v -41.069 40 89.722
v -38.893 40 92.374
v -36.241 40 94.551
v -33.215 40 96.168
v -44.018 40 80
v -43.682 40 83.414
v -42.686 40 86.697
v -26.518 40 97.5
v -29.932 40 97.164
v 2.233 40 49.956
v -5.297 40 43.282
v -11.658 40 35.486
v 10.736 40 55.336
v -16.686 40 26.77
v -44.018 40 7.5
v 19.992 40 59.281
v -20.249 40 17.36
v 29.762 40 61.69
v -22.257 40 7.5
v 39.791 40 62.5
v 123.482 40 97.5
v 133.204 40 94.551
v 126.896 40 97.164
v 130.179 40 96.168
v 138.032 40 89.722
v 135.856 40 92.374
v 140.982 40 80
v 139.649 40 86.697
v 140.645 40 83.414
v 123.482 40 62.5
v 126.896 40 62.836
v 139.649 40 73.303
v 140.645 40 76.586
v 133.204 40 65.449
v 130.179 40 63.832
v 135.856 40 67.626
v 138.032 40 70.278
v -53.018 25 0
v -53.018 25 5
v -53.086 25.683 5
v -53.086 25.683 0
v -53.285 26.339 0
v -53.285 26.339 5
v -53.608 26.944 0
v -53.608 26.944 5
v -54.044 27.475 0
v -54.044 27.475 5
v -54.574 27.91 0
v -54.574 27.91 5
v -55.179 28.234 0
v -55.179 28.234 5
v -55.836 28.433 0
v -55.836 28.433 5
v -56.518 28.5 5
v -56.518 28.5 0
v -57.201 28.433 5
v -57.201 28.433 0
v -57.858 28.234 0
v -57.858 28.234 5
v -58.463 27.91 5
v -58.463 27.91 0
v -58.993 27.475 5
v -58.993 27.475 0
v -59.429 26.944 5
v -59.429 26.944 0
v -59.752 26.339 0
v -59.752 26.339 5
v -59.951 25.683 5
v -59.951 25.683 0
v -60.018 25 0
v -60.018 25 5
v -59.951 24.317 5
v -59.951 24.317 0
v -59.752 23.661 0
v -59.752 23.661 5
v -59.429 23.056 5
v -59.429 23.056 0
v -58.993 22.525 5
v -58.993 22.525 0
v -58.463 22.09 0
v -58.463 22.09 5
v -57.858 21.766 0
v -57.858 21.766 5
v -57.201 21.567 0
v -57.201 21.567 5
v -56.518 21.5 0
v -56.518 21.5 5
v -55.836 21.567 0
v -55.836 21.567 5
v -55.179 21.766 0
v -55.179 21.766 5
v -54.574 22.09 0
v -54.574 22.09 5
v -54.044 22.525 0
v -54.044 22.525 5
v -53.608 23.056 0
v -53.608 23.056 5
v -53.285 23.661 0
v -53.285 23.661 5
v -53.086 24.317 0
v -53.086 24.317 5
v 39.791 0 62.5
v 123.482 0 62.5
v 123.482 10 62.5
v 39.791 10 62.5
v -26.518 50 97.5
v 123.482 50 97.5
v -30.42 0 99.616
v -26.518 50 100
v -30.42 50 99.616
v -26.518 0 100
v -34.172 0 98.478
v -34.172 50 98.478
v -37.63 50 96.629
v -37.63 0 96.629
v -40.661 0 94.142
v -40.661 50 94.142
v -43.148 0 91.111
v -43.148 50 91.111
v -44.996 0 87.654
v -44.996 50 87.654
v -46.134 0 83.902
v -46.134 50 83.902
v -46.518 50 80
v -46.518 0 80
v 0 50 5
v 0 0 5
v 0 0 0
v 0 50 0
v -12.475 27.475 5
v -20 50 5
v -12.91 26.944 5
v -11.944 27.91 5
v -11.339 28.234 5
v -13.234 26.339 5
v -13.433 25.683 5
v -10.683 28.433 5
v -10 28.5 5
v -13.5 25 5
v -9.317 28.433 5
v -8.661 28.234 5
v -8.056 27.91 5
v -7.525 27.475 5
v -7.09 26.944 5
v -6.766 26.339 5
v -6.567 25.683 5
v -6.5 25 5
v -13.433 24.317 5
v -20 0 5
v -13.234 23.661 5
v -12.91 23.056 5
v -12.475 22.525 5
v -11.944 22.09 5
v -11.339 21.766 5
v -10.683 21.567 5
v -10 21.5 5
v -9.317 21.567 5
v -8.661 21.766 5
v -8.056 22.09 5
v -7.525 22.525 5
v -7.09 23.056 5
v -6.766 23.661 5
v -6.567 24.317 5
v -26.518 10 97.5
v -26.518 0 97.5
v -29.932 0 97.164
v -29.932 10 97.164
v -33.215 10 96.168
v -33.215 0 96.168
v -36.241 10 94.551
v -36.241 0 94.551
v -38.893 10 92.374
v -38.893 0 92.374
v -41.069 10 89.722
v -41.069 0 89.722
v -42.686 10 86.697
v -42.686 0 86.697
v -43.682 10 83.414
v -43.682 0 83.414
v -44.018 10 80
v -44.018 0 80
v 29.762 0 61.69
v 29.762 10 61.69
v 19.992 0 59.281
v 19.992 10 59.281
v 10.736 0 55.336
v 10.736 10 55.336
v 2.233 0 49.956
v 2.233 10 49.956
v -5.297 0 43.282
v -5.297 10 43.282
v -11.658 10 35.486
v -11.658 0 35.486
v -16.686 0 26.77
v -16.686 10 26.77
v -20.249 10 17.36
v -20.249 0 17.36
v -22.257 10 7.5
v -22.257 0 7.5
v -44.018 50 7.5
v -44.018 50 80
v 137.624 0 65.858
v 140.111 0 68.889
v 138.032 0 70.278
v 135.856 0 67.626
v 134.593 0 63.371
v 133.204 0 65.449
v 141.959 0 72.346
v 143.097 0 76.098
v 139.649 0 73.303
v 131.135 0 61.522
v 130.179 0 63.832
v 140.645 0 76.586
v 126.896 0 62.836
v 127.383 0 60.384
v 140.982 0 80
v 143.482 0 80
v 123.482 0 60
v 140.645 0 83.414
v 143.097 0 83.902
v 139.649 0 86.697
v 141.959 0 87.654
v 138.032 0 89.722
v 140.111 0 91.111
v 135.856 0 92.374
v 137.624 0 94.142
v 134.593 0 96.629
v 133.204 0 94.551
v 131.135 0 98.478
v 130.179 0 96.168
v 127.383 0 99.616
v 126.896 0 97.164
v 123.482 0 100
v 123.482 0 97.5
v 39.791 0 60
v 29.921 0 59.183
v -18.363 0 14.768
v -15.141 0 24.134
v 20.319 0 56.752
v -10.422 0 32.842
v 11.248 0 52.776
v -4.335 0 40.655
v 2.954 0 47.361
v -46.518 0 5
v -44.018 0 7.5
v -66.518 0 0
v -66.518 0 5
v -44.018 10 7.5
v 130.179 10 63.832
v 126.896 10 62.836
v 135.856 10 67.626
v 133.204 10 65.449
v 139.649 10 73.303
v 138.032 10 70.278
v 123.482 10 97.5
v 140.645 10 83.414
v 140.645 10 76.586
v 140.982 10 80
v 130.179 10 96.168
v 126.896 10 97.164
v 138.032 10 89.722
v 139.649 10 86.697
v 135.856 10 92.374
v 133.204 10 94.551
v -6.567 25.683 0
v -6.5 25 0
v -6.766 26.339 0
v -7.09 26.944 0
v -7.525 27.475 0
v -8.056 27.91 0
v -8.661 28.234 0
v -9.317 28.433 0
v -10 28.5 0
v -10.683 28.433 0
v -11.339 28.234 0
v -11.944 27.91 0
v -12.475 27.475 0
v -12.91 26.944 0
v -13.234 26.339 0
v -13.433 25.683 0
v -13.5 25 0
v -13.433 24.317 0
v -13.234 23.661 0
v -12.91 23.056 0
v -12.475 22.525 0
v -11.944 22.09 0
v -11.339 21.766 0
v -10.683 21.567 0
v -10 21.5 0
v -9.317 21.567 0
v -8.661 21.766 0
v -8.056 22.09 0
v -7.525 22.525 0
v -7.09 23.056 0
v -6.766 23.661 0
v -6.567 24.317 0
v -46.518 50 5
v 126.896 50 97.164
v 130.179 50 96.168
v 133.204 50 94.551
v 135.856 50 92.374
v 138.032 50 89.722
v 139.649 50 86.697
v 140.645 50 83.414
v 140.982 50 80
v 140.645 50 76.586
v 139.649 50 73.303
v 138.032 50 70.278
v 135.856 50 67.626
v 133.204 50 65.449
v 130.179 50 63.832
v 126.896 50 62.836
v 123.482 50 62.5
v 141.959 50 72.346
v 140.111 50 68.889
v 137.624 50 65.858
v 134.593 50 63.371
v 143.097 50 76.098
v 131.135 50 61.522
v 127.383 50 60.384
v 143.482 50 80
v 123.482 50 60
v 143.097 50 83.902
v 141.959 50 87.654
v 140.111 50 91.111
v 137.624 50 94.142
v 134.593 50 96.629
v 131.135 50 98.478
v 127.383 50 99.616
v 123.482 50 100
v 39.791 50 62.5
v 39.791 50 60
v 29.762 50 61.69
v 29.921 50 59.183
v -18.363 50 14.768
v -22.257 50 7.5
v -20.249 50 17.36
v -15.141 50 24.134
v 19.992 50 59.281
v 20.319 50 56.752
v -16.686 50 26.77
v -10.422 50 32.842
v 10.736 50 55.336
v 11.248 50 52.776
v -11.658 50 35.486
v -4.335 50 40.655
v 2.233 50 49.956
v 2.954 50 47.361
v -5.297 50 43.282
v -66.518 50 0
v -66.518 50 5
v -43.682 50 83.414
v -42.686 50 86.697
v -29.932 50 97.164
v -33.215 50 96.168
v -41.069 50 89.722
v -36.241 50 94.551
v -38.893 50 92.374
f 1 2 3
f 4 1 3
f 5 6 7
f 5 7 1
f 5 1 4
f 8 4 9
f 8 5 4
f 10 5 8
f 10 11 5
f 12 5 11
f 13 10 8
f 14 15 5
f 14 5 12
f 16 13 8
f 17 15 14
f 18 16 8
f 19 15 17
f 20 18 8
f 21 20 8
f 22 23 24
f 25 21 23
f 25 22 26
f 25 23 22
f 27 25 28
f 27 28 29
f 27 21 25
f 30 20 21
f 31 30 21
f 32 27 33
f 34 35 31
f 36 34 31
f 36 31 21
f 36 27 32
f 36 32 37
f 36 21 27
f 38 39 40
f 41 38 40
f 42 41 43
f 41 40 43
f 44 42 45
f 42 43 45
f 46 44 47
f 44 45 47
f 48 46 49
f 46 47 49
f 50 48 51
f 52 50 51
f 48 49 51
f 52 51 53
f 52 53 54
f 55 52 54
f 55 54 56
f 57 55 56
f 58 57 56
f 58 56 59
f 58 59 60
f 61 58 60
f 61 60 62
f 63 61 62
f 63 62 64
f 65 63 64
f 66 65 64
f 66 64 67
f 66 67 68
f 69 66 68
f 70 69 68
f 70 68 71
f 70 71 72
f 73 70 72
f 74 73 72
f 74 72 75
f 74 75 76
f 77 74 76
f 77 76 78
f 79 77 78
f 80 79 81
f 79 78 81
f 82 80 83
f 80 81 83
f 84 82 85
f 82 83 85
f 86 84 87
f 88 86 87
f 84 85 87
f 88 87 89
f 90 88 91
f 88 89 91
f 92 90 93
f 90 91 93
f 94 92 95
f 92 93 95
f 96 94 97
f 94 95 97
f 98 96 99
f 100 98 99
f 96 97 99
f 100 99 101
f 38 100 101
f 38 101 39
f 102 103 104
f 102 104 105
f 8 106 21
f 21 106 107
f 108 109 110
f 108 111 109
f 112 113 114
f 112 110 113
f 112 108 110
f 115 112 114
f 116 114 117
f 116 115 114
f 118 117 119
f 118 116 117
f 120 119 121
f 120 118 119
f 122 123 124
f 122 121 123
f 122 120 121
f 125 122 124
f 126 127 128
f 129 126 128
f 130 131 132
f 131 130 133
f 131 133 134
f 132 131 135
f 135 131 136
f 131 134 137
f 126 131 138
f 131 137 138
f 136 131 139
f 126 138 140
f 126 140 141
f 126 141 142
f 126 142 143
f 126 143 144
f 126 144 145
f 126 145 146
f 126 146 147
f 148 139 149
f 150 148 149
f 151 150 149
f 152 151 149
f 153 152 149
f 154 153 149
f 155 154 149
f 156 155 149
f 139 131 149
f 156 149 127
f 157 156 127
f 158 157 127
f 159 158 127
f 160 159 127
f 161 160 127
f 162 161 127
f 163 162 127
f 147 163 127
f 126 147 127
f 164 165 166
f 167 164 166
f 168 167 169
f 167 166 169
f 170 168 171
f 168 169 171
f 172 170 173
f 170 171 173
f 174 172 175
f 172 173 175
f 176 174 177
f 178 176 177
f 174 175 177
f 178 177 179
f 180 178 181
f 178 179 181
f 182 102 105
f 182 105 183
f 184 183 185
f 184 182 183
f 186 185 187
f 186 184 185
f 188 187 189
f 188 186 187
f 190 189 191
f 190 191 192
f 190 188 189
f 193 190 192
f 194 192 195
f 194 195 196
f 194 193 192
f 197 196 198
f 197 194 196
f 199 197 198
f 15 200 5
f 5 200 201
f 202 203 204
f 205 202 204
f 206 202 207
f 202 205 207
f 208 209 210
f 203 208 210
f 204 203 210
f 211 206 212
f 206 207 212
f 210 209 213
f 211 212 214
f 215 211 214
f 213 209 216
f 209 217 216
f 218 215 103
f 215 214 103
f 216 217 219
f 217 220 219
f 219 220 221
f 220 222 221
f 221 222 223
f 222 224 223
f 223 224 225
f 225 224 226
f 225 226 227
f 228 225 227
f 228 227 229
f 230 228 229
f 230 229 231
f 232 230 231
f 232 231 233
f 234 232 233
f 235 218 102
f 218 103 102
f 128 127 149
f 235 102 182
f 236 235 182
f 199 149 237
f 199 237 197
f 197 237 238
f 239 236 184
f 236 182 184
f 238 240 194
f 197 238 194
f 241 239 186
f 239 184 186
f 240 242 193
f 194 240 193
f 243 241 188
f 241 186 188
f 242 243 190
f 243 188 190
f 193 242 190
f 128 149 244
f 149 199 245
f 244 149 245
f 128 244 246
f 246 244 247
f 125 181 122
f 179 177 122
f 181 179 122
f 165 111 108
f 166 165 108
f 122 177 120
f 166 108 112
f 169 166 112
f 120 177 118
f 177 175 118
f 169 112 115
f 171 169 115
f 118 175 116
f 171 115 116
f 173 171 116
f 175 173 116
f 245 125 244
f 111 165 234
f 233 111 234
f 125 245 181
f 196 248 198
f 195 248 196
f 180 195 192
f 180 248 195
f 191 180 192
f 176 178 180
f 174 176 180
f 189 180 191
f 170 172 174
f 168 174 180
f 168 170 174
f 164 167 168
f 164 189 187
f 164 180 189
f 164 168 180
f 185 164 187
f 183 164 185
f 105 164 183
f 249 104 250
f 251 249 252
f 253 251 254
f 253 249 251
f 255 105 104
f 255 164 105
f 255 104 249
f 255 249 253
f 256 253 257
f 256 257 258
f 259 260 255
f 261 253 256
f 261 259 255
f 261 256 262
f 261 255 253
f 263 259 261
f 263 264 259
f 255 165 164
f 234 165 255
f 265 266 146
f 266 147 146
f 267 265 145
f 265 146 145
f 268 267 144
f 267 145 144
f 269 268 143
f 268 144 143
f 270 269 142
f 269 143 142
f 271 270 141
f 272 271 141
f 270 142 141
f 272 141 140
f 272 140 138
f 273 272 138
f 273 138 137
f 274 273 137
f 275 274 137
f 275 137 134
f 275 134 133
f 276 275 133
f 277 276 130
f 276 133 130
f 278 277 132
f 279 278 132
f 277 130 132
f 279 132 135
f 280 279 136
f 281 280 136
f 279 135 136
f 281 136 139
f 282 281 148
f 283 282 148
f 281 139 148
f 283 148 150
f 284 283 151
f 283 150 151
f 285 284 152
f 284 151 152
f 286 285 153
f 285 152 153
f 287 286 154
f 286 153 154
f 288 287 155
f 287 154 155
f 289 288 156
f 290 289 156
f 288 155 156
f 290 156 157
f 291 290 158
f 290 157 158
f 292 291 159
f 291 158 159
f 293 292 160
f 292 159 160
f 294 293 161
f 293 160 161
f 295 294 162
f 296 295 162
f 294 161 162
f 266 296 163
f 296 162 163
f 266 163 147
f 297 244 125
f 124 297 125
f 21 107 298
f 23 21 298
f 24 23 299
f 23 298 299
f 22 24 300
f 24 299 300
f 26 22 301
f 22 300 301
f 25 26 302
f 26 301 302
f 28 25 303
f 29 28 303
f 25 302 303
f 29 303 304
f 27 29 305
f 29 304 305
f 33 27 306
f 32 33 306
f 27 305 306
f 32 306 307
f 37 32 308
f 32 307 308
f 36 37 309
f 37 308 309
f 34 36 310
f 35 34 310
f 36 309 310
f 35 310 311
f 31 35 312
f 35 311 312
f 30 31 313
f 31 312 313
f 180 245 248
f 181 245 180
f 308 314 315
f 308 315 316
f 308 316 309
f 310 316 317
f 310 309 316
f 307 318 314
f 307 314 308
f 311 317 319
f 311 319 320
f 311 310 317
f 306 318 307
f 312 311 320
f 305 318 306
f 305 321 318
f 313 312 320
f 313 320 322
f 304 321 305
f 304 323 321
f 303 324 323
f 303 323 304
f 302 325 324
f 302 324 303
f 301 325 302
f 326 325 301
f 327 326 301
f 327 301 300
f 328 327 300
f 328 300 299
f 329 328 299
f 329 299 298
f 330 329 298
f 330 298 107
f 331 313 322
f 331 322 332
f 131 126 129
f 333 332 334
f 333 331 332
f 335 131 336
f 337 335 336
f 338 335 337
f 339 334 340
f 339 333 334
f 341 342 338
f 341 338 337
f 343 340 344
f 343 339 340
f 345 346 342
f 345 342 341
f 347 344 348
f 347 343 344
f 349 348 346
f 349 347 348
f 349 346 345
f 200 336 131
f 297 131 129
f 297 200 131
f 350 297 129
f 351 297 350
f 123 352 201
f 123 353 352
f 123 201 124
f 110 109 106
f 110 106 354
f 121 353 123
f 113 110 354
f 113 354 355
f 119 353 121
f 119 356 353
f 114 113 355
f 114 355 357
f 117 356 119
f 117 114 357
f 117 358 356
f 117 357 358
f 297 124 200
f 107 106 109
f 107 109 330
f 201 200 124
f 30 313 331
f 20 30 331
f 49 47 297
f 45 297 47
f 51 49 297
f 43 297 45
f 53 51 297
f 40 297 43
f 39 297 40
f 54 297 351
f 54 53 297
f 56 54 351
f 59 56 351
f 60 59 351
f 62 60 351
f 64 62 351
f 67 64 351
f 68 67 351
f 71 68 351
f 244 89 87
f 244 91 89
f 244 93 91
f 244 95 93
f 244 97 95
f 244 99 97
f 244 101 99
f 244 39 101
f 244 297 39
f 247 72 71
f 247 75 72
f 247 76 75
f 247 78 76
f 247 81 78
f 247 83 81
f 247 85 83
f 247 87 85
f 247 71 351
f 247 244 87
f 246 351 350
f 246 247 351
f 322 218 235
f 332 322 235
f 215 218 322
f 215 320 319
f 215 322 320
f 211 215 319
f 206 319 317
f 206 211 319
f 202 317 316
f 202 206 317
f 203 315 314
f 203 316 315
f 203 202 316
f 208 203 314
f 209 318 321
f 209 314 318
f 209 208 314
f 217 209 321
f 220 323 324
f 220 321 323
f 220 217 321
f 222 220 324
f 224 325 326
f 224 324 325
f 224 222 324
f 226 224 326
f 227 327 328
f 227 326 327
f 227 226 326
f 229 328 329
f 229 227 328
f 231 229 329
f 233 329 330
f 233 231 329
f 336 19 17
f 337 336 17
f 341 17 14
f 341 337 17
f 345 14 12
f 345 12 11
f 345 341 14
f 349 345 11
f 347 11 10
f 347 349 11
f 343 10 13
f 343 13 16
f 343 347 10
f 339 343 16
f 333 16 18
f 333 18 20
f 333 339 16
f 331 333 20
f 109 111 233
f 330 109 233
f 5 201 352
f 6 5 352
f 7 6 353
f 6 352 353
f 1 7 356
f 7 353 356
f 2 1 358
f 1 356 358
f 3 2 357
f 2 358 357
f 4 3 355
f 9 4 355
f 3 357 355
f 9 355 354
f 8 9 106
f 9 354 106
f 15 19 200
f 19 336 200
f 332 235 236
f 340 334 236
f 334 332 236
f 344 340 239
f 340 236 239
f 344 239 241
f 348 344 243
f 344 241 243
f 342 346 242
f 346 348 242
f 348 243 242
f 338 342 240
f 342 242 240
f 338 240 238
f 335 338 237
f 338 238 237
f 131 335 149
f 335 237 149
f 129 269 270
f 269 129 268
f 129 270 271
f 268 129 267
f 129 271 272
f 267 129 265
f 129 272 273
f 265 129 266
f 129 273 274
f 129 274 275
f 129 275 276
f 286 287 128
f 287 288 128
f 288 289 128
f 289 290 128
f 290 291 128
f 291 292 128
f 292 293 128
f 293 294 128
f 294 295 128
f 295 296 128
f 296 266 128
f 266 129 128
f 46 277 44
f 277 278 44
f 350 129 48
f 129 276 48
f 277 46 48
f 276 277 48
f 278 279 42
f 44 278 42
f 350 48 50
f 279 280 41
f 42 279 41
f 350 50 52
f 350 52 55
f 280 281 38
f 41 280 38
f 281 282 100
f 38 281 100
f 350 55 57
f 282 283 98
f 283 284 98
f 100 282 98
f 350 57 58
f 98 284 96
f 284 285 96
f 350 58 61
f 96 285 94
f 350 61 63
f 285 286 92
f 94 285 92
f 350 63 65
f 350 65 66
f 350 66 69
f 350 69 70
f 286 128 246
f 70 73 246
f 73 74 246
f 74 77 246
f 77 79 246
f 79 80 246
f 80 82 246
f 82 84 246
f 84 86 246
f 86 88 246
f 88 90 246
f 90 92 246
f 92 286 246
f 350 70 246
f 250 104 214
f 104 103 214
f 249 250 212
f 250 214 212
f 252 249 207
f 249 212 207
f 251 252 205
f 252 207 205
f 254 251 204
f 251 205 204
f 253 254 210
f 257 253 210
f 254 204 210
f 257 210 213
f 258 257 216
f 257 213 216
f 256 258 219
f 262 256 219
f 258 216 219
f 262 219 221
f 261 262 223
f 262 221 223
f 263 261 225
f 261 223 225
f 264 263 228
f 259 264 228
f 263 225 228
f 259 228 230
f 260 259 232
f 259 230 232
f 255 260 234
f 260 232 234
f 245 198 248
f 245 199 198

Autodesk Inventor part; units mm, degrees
ref_plane "YZ Plane" through (0, 0, 0) normal (1, 0, 0) x (0, 1, 0)
ref_plane "XZ Plane" through (0, 0, 0) normal (0, 1, 0) x (-1, 0, 0)
ref_plane "XY Plane" through (0, 0, 0) normal (0, 0, 1) x (1, 0, 0)
sketch "Sketch1" plane through (0, 0, 0) normal (0, 1, 0) x (-1, 0, 0)
  line L0 (0, 0) -> (80, 0)
  line L1 (20, 5) -> (0, 5)
  line L2 (0, 5) -> (0, 0)
  line L3 (46.5184, 5) -> (46.5184, 80)
  circle A0 centre (26.5184, 80) radius 20
  line L4 (26.5184, 100) -> (-123.4816, 100)
  circle A1 centre (-123.4816, 80) radius 20
  line L5 (-123.4816, 60) -> (-39.7913, 60)
  arc A2 (20, 5) -> (-39.7913, 60) centre (-39.7913, 0) ccw
  line L6 (46.5184, 5) -> (66.5184, 5)
  line L7 (66.5184, 5) -> (66.5184, 0)
  line L8 (66.5184, 0) -> (46.5184, 0)
  point P0 (16.5184, 60)
  dimension "d1" = 75
  dimension "d2" = 40
  dimension "d3" = 150
  dimension "d4" = 140
  dimension "d7" = 40
  dimension "d10" = 5
  dimension "d11" = 5
extrude "Extrusion1" add sketch "Sketch1" along normal blind 50
sketch "Sketch2" plane through (-20, 0, 5) normal (0, 0, 1) x (1, 0, 0)
  circle A0 centre (10, 25) radius 3.5
  line L0 (20, 0) -> (20, 50) projected
  line L1 (0, 50) -> (20, 50) projected
  circle A1 centre (-36.5184, 25) radius 3.5
  line L2 (-46.5184, 0) -> (-46.5184, 50) projected
  line L3 (-46.5184, 50) -> (-26.5184, 50) projected
  dimension "d14" = 7
  dimension "d15" = 10
  dimension "d16" = 25
  dimension "d17" = 7
  dimension "d18" = 10
  dimension "d22" = 25
extrude "Extrusion2" cut sketch "Sketch2" against normal blind 20
sketch "Sketch3" plane through (0, 50, 0) normal (0, 1, 0) x (1, 0, 0)
  line L0 (-46.5184, -5) -> (-46.5184, -80) projected
  arc A0 (-20, -5) -> (39.7913, -60) centre (39.7913, 0) ccw projected
  line L1 (-26.5184, -100) -> (123.4816, -100) projected
  arc A1 (123.4816, -100) -> (123.4816, -60) centre (123.4816, -80) ccw projected
  line L2 (123.4816, -60) -> (39.7913, -60) projected
  arc A2 (-20, -5) -> (39.7913, -60) centre (39.7913, 0) ccw projected
  line L3 (-46.5184, -5) -> (-46.5184, -80) projected
  arc A3 (-46.5184, -80) -> (-26.5184, -100) centre (-26.5184, -80) ccw projected
  arc A4 (-46.5184, -80) -> (-26.5184, -100) centre (-26.5184, -80) ccw projected
  line L4 (-46.5184, -5) -> (-20, -5)
  line L5 (-26.5184, -97.5) -> (123.4816, -97.5)
  arc A5 (123.4816, -97.5) -> (123.4816, -62.5) centre (123.4816, -80) ccw
  line L6 (123.4816, -62.5) -> (39.7913, -62.5)
  arc A6 (-22.2571, -7.5) -> (39.7913, -62.5) centre (39.7913, 0) ccw
  line L7 (-22.2571, -7.5) -> (-44.0184, -7.5)
  line L8 (-44.0184, -7.5) -> (-44.0184, -80)
  line L9 (-26.5184, -97.5) -> (123.4816, -97.5)
  arc A7 (123.4816, -97.5) -> (123.4816, -62.5) centre (123.4816, -80) ccw
  line L10 (123.4816, -62.5) -> (39.7913, -62.5)
  arc A8 (-22.2571, -7.5) -> (39.7913, -62.5) centre (39.7913, 0) ccw
  line L11 (-22.2571, -7.5) -> (-44.0184, -7.5)
  line L12 (-44.0184, -7.5) -> (-44.0184, -80)
  arc A9 (-44.0184, -80) -> (-26.5184, -97.5) centre (-26.5184, -80) ccw
  point P0 (0, 0)
  point P1 (39.7913, -60)
  dimension "d24" = 2.5
  dimension "d25" = 2.5
extrude "Extrusion3" cut sketch "Sketch3" against normal blind 10 contours A9 L8 L7 A6 L6 A5 L5
sketch "Sketch4" plane through (0, 0, 0) normal (0, -1, 0) x (1, 0, 0)
  arc A0 (39.7913, 60) -> (-20, 5) centre (39.7913, 0) ccw projected
  line L0 (-20, 5) -> (-46.5184, 5)
  line L1 (-46.5184, 5) -> (-46.5184, 80) projected
  arc A1 (-26.5184, 100) -> (-46.5184, 80) centre (-26.5184, 80) ccw projected
  line L2 (123.4816, 60) -> (39.7913, 60) projected
  arc A2 (123.4816, 60) -> (123.4816, 100) centre (123.4816, 80) ccw projected
  line L3 (-26.5184, 100) -> (123.4816, 100) projected
  arc A3 (123.4816, 62.5) -> (123.4816, 97.5) centre (123.4816, 80) ccw
  line L4 (123.4816, 62.5) -> (39.7913, 62.5)
  arc A4 (39.7913, 62.5) -> (-22.2571, 7.5) centre (39.7913, 0) ccw
  line L5 (-22.2571, 7.5) -> (-44.0184, 7.5)
  line L6 (-44.0184, 7.5) -> (-44.0184, 80)
  arc A5 (-26.5184, 97.5) -> (-44.0184, 80) centre (-26.5184, 80) ccw
  line L7 (-26.5184, 97.5) -> (123.4816, 97.5)
  point P0 (0, 0)
  dimension "d28" = 2.5
extrude "Extrusion4" cut sketch "Sketch4" against normal blind 10 contours L4 A4 L5 L6 A5 L7 A3
properties part number "Pylon"
